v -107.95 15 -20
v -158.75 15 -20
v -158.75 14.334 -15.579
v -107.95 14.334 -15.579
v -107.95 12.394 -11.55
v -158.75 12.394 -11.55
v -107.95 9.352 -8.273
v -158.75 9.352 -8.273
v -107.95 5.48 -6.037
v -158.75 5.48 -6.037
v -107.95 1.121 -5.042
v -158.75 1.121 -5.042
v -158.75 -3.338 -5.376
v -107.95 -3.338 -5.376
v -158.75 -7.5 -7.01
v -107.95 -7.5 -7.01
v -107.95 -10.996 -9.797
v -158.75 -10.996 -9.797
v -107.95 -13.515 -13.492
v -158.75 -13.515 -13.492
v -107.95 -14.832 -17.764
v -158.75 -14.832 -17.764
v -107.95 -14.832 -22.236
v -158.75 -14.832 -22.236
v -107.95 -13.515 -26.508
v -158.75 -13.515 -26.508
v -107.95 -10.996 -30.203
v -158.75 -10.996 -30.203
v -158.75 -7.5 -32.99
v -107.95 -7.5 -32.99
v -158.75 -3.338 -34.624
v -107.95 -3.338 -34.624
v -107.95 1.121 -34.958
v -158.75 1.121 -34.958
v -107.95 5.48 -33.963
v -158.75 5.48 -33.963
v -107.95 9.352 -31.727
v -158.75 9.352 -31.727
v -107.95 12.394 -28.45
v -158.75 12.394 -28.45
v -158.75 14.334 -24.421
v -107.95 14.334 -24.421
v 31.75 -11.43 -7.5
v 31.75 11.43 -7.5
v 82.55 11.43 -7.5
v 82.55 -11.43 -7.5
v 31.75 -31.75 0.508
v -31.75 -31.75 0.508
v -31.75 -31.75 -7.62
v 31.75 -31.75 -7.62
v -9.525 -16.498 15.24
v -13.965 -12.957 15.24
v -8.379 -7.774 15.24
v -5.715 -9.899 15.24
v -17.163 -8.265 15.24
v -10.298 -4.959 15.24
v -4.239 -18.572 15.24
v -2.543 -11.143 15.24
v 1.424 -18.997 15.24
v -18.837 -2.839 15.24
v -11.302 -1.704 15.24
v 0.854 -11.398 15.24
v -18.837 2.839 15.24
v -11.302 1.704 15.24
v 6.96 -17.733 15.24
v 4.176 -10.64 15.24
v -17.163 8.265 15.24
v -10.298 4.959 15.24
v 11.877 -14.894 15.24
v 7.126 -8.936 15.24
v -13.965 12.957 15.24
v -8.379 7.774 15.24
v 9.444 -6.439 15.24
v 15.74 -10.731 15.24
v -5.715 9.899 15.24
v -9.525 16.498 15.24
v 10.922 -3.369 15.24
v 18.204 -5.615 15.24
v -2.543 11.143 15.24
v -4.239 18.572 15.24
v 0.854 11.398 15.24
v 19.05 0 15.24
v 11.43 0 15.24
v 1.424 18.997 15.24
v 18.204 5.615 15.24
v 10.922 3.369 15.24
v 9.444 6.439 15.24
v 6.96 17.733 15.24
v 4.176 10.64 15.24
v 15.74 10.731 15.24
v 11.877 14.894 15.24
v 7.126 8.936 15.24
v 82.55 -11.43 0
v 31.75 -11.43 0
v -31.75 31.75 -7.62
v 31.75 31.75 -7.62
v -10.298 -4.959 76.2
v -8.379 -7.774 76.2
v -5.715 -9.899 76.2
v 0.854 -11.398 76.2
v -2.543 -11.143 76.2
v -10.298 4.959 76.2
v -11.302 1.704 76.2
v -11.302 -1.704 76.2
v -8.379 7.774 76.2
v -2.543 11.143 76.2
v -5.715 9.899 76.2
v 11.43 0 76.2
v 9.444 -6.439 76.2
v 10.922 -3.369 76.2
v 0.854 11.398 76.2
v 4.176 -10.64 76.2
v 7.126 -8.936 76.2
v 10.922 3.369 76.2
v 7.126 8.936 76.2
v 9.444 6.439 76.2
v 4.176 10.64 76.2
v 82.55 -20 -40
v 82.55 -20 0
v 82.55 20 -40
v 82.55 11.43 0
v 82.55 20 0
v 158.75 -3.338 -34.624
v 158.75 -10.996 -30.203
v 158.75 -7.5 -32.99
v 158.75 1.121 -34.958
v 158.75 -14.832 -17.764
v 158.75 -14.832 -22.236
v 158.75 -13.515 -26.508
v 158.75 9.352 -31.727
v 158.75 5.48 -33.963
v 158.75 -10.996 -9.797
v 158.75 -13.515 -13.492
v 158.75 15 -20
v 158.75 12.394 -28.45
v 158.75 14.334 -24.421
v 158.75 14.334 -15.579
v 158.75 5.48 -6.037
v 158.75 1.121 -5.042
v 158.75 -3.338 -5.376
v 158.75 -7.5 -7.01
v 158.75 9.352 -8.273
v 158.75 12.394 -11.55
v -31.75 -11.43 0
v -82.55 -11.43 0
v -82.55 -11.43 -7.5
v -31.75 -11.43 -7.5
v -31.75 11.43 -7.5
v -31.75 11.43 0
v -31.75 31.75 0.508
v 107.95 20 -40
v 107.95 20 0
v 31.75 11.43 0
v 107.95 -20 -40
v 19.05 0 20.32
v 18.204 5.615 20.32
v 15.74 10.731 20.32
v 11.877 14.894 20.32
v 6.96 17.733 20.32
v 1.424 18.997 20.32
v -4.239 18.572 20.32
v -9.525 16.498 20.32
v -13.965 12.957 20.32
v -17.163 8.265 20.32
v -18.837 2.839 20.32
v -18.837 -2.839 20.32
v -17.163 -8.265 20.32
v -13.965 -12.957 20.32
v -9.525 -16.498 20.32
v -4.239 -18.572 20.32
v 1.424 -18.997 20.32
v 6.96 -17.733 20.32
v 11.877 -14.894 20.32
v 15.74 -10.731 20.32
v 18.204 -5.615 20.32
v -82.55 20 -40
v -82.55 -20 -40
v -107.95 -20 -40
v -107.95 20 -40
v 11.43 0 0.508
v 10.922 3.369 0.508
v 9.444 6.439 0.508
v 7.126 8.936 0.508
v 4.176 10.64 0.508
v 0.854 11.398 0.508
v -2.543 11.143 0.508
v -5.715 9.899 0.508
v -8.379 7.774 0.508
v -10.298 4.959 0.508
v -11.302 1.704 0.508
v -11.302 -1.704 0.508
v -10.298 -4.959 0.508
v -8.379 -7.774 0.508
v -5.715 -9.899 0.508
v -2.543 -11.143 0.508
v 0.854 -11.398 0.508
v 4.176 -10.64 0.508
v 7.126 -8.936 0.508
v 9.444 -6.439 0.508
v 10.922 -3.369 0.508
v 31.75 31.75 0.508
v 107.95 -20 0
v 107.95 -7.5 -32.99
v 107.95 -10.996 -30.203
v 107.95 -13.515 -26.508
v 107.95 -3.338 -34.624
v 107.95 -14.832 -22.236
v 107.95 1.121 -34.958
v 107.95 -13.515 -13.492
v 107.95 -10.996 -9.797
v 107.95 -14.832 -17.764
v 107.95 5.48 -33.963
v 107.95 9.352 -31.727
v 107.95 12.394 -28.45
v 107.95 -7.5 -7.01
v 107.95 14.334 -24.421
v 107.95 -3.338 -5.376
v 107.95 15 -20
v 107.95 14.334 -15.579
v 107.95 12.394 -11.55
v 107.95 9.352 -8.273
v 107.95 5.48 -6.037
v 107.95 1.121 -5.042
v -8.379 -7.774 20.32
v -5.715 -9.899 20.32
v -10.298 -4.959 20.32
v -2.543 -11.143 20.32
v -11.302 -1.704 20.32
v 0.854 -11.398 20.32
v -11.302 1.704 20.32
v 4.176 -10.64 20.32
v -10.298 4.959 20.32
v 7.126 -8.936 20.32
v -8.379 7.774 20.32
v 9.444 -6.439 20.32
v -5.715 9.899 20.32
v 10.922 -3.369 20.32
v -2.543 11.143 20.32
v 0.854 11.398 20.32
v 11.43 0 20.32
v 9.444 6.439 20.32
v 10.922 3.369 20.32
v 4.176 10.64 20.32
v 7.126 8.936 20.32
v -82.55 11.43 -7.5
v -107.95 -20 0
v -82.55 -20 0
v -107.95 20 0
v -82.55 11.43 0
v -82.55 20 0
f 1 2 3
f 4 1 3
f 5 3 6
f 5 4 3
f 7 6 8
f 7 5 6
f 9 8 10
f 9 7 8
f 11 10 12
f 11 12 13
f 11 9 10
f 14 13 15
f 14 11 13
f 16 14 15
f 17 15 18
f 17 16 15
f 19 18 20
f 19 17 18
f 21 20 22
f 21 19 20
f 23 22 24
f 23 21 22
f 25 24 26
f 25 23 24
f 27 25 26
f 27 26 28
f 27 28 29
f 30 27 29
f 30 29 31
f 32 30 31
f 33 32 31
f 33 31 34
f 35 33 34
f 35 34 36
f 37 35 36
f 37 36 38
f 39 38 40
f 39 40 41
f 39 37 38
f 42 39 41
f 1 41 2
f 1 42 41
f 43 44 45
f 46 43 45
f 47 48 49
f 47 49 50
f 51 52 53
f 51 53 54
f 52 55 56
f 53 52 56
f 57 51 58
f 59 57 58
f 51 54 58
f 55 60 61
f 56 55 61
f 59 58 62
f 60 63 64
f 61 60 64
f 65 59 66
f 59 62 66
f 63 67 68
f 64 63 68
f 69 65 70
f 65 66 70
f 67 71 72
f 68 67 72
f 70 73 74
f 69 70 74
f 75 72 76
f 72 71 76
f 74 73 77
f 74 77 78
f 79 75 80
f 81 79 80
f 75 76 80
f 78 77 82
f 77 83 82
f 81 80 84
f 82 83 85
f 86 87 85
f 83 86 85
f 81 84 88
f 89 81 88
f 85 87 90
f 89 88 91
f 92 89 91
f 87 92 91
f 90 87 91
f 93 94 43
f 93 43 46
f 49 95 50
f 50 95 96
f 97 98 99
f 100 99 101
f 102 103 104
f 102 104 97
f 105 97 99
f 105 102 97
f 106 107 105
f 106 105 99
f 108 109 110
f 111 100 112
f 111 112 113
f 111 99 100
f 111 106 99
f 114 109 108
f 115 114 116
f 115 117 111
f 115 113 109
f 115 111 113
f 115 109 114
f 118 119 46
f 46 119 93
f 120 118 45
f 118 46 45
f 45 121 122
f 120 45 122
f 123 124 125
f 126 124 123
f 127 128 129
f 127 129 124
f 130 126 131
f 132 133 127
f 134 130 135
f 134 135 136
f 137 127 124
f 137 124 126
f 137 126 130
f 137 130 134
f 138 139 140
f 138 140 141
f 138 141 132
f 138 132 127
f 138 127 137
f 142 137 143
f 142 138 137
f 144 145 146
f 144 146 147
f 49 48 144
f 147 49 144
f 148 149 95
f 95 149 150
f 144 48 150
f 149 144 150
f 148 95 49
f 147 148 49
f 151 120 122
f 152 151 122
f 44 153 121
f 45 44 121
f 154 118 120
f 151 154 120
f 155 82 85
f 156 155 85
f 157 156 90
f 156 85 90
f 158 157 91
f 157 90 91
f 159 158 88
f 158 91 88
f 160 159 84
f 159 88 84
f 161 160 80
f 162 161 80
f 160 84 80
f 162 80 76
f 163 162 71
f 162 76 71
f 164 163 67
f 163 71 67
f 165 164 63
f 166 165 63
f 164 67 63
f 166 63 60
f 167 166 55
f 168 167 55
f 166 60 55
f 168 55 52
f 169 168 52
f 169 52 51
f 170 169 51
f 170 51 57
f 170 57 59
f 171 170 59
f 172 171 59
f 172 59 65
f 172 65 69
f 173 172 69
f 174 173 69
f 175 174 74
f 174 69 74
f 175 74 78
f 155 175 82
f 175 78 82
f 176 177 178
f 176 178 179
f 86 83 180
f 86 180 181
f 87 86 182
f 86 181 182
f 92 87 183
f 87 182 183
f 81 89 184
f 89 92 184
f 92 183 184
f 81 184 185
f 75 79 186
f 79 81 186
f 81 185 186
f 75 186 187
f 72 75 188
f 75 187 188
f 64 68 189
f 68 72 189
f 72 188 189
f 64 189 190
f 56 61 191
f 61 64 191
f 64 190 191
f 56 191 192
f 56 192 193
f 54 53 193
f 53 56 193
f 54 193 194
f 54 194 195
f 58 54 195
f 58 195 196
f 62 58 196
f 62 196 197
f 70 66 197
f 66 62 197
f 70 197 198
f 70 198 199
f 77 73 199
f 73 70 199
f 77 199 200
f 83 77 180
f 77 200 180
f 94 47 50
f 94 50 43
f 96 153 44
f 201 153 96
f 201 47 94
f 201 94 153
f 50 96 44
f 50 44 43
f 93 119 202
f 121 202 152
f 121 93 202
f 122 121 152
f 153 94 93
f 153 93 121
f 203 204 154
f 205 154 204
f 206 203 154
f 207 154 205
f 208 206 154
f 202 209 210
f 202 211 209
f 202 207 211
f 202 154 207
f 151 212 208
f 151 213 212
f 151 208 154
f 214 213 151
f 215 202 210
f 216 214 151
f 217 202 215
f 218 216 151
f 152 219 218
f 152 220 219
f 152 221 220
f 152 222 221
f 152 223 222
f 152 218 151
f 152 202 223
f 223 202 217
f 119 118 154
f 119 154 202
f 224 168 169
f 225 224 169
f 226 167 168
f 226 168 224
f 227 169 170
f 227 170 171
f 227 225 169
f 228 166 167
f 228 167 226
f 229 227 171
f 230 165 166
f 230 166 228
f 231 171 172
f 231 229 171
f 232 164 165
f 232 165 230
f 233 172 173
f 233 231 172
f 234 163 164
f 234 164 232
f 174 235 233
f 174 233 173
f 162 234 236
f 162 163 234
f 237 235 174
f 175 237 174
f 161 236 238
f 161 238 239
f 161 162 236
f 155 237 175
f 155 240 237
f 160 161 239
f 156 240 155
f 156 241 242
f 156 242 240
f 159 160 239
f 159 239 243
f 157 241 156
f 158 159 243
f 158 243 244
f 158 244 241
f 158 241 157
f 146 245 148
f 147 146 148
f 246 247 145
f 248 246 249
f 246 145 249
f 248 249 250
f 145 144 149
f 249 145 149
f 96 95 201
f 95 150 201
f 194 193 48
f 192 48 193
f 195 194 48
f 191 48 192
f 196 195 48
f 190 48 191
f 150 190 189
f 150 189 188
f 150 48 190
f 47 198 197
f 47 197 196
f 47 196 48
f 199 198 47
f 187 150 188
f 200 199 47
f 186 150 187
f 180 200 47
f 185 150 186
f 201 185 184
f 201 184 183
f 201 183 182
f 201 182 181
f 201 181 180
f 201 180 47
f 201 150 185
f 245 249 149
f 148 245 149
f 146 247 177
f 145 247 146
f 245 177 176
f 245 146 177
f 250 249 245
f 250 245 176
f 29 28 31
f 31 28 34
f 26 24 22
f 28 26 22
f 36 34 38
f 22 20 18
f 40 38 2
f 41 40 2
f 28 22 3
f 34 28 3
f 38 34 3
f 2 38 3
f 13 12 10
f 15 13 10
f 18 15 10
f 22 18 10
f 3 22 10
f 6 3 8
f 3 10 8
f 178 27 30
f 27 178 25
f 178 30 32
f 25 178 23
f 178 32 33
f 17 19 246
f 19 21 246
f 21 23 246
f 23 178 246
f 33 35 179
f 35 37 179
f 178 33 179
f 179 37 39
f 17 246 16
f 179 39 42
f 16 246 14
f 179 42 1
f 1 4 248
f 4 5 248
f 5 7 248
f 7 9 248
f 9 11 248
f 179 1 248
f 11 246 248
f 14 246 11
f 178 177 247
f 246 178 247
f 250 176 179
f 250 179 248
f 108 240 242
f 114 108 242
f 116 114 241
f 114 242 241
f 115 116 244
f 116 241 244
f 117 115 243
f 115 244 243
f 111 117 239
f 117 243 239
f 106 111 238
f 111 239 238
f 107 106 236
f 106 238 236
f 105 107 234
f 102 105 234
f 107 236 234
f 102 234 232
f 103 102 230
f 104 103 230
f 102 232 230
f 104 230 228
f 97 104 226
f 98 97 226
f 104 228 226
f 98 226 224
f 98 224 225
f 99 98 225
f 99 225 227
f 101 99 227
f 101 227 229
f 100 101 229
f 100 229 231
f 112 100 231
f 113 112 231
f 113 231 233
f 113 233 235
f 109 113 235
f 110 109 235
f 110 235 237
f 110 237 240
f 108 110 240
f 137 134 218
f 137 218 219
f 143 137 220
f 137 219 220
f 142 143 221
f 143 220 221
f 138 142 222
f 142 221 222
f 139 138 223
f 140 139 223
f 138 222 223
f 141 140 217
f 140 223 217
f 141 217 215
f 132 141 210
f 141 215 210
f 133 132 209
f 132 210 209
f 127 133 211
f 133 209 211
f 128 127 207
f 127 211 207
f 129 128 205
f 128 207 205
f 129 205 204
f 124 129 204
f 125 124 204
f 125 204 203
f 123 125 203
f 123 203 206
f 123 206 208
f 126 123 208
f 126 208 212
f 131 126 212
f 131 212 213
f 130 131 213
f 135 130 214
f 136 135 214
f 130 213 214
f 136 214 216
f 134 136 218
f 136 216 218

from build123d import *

# Parameters (mm, degrees)
F0_R          = 11.43
F1_DEPTH      = 76.2
F3_START      = 15.24
F2_R          = 19.05
F3_DEPTH      = 5.08
F4_W          = 215.9
F4_H          = 22.86
F4_R          = 5.08
F5_DEPTH      = 7.5
F2_W          = 63.5
F2_H          = 63.5
F2_R_2        = 22.225
F6_DEPTH      = 0.508
F6_DEPTH_BACK = 7.62
F8_START      = 82.55
F7_W          = 40
F7_H          = 40
F7_R          = 15
F8_DEPTH      = 25.4
F9_START      = 107.95
F9_DEPTH      = 50.8
F10_START     = -82.55
F10_DEPTH     = 25.4
F11_START     = -107.95
F11_DEPTH     = 50.8


with BuildPart() as f1:
    # F0 (on Top) → F1 (new body)
    with BuildSketch(Plane.XY):
        Circle(F0_R)
    extrude(amount=F1_DEPTH)

    # F2 (on Top) → F3 (join)
    with BuildSketch(Plane.XY.offset(F3_START)):
        Circle(F2_R)
    extrude(amount=F3_DEPTH)

    # F4 (on Top) → F5 (join)
    with BuildSketch(Plane.XY):
        Rectangle(F4_W, F4_H)
        with Locations((-97.79, 0)):
            Circle(F4_R, mode=Mode.SUBTRACT)
        with Locations((97.79, 0)):
            Circle(F4_R, mode=Mode.SUBTRACT)
    extrude(amount=-F5_DEPTH)

    # F2 (on Top) → F6 (join, two sides)
    with BuildSketch(Plane.XY) as f6_sk:
        Rectangle(F2_W, F2_H)
        Circle(F2_R_2, mode=Mode.SUBTRACT)
        Circle(F2_R_2)
        Circle(F2_R, mode=Mode.SUBTRACT)
        Circle(F2_R)
    extrude(amount=F6_DEPTH)
    extrude(f6_sk.sketch, amount=-F6_DEPTH_BACK)

    # F7 (on Right) → F8 (join)
    with BuildSketch(Plane.YZ.offset(F8_START)):
        with Locations((0, -20)):
            Rectangle(F7_W, F7_H)
        with Locations((0, -20)):
            Circle(F7_R, mode=Mode.SUBTRACT)
        with Locations((0, -20)):
            Circle(F7_R)
    extrude(amount=F8_DEPTH)

    # F7 (on Right) → F9 (join)
    with BuildSketch(Plane.YZ.offset(F9_START)):
        with Locations((0, -20)):
            Circle(F7_R)
    extrude(amount=F9_DEPTH)

    # F7 (on Right) → F10 (join)
    with BuildSketch(Plane.YZ.offset(F10_START)):
        with Locations((0, -20)):
            Rectangle(F7_W, F7_H)
        with Locations((0, -20)):
            Circle(F7_R, mode=Mode.SUBTRACT)
        with Locations((0, -20)):
            Circle(F7_R)
    extrude(amount=-F10_DEPTH)

    # F7 (on Right) → F11 (join)
    with BuildSketch(Plane.YZ.offset(F11_START)):
        with Locations((0, -20)):
            Circle(F7_R)
    extrude(amount=-F11_DEPTH)


solid = f1.part
